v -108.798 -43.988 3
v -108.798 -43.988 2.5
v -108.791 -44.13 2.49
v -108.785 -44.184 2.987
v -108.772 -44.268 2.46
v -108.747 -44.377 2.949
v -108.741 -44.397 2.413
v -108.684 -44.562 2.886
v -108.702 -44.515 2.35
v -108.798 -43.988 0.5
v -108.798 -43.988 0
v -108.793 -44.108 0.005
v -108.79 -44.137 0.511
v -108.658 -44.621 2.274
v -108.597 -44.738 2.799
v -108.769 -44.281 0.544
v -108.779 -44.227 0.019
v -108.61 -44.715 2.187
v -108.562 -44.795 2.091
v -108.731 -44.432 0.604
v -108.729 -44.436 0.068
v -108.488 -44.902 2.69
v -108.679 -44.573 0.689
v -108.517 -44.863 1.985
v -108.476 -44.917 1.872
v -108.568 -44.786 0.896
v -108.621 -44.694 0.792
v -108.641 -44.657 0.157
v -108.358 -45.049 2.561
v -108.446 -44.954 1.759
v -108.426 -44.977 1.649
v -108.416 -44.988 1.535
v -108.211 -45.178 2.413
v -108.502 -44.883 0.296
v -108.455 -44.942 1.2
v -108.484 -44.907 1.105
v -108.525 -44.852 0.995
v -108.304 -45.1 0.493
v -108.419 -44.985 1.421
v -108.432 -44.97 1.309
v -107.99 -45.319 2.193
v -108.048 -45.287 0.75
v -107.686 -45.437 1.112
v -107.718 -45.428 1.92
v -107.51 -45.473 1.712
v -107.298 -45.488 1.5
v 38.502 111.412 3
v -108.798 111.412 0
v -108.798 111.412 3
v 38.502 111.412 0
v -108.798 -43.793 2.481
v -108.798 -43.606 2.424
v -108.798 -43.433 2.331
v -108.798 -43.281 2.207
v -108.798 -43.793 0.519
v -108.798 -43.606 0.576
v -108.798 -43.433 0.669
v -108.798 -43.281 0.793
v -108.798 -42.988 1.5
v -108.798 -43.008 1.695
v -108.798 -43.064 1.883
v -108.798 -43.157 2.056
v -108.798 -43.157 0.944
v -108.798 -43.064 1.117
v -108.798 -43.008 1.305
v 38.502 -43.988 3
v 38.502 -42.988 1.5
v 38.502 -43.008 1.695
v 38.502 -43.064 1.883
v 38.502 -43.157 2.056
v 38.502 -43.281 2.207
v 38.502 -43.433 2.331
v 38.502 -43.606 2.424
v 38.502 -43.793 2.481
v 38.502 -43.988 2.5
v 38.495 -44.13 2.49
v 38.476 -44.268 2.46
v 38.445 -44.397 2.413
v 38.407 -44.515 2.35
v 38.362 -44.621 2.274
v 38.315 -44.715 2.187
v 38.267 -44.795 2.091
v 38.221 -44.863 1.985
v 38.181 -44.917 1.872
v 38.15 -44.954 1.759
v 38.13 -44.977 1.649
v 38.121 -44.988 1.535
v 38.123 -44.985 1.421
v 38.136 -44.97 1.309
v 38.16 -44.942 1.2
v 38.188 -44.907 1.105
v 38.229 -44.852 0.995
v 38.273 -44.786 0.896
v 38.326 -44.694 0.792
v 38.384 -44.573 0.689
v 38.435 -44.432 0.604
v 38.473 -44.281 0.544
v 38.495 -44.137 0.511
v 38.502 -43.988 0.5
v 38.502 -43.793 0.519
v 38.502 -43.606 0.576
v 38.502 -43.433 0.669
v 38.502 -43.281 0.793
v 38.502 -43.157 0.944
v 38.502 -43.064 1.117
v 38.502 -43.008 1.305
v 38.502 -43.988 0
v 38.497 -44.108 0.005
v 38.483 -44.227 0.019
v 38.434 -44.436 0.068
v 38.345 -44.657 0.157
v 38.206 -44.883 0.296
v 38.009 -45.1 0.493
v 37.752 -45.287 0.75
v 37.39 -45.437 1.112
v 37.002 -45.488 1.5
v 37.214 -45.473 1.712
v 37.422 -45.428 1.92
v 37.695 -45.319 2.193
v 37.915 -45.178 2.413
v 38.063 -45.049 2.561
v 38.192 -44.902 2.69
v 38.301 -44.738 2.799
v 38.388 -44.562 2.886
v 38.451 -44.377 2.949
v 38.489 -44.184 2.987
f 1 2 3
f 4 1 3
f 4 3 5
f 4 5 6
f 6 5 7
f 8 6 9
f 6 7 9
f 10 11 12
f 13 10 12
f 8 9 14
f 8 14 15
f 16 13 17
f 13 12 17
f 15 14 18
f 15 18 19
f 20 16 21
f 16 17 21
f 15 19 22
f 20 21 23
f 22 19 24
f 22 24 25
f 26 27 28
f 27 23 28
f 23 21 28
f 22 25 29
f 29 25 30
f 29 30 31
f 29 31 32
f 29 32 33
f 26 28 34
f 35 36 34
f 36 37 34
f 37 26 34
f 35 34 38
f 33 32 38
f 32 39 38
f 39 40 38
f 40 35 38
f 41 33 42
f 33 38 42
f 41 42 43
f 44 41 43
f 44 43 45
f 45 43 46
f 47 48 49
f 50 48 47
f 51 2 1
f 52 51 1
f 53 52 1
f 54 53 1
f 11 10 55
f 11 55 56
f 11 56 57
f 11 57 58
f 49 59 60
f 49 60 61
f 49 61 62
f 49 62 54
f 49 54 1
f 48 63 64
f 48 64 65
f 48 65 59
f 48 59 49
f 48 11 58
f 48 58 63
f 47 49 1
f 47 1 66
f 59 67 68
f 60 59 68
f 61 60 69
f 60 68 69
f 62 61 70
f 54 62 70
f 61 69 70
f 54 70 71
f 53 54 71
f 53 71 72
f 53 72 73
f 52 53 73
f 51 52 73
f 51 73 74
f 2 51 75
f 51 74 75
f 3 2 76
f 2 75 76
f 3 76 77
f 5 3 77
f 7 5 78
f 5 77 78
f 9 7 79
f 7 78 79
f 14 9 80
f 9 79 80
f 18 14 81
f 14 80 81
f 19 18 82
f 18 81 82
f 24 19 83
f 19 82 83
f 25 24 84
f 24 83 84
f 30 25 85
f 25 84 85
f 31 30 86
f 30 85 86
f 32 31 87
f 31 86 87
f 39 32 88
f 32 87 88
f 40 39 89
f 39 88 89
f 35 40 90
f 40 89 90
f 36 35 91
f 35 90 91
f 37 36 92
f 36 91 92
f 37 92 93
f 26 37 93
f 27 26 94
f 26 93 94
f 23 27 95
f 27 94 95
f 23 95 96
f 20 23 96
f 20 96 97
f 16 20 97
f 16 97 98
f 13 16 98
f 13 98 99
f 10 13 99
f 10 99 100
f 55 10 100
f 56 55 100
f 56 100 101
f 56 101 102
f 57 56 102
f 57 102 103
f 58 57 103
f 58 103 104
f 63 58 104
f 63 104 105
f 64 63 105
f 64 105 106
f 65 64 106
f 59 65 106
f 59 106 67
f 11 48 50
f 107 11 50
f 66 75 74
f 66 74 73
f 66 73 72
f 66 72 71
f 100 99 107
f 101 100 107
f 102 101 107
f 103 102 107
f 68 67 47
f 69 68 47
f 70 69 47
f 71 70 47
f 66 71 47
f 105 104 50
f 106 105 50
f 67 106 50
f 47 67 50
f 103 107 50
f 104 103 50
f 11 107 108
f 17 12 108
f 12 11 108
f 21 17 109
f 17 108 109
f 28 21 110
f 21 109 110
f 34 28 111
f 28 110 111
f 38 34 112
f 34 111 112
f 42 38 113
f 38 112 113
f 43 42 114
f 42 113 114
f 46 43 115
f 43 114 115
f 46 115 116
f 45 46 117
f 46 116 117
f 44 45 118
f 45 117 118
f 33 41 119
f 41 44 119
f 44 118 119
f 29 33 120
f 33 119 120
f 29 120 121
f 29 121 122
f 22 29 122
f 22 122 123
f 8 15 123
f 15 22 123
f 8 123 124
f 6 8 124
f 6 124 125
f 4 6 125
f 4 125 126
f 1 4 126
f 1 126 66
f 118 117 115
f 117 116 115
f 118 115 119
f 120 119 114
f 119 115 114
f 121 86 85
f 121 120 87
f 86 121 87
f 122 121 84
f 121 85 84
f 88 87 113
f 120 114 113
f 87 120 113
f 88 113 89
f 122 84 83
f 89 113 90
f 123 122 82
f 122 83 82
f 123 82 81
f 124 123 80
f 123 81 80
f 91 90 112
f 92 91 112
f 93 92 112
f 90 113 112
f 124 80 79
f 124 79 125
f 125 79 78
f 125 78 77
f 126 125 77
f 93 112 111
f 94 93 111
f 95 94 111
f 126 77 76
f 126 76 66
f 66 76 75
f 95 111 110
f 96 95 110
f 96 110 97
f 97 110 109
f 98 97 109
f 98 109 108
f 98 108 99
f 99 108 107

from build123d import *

# Parameters (mm, degrees)
SKETCH_1_W          = 147.3
SKETCH_1_H          = 156.9
EXTRUDE_1_DEPTH     = 3
SKETCH_2_R          = 1
CUT_EXTRUDE_1_DEPTH = 185.712864908
FILLET_1_R          = 1.5


with BuildPart() as part:
    # 草图1 → 凸台-拉伸1 (new body)
    with BuildSketch(Plane.XY):
        with Locations((-35.147833333, 32.96163522)):
            Rectangle(SKETCH_1_W, SKETCH_1_H)
    extrude(amount=EXTRUDE_1_DEPTH)

    # 草图2 → 切除-拉伸1 (cut, through all)
    with BuildSketch(Plane(origin=(38.502166667, 0, 0), x_dir=(0, 0, -1), z_dir=(1, 0, 0))):
        with Locations(Location((-1.5, -43.98836478, 0), (0, 0, 90))):
            Circle(SKETCH_2_R)
    extrude(amount=-CUT_EXTRUDE_1_DEPTH, mode=Mode.SUBTRACT)

    # 圆角1
    # the kernel refuses this fillet: 1.5 mm, written as the material it takes off along each edge
    with BuildSketch(Plane(origin=(42.252166667, -45.48836478, 3), x_dir=(0, 1, 0), z_dir=(-1, 0, 0))) as fillet_1_piece_1:
        with BuildLine():
            CenterArc((FILLET_1_R, FILLET_1_R), FILLET_1_R, 180, 90)
            Line((0, FILLET_1_R), (0, 0))
            Line((0, 0), (FILLET_1_R, 0))
        make_face()
    extrude(amount=154.8, mode=Mode.SUBTRACT)
    with BuildSketch(Plane(origin=(42.252166667, -45.48836478, 0), x_dir=(0, 1, 0), z_dir=(-1, 0, 0))) as fillet_1_piece_2:
        with BuildLine():
            CenterArc((FILLET_1_R, -FILLET_1_R), FILLET_1_R, 90, 90)
            Line((0, -FILLET_1_R), (0, 0))
            Line((0, 0), (FILLET_1_R, 0))
        make_face()
    extrude(amount=154.8, mode=Mode.SUBTRACT)
    with BuildSketch(Plane(origin=(38.502166667, -45.48836478, -3.75), x_dir=(0, 1, 0), z_dir=(0, 0, 1))) as fillet_1_piece_3:
        with BuildLine():
            CenterArc((FILLET_1_R, FILLET_1_R), FILLET_1_R, 180, 90)
            Line((0, FILLET_1_R), (0, 0))
            Line((0, 0), (FILLET_1_R, 0))
        make_face()
    extrude(amount=10.5, mode=Mode.SUBTRACT)
    with BuildSketch(Plane(origin=(-108.797833333, -45.48836478, -3.75), x_dir=(0, 1, 0), z_dir=(0, 0, 1))) as fillet_1_piece_4:
        with BuildLine():
            CenterArc((FILLET_1_R, -FILLET_1_R), FILLET_1_R, 90, 90)
            Line((0, -FILLET_1_R), (0, 0))
            Line((0, 0), (FILLET_1_R, 0))
        make_face()
    extrude(amount=10.5, mode=Mode.SUBTRACT)


solid = part.part
